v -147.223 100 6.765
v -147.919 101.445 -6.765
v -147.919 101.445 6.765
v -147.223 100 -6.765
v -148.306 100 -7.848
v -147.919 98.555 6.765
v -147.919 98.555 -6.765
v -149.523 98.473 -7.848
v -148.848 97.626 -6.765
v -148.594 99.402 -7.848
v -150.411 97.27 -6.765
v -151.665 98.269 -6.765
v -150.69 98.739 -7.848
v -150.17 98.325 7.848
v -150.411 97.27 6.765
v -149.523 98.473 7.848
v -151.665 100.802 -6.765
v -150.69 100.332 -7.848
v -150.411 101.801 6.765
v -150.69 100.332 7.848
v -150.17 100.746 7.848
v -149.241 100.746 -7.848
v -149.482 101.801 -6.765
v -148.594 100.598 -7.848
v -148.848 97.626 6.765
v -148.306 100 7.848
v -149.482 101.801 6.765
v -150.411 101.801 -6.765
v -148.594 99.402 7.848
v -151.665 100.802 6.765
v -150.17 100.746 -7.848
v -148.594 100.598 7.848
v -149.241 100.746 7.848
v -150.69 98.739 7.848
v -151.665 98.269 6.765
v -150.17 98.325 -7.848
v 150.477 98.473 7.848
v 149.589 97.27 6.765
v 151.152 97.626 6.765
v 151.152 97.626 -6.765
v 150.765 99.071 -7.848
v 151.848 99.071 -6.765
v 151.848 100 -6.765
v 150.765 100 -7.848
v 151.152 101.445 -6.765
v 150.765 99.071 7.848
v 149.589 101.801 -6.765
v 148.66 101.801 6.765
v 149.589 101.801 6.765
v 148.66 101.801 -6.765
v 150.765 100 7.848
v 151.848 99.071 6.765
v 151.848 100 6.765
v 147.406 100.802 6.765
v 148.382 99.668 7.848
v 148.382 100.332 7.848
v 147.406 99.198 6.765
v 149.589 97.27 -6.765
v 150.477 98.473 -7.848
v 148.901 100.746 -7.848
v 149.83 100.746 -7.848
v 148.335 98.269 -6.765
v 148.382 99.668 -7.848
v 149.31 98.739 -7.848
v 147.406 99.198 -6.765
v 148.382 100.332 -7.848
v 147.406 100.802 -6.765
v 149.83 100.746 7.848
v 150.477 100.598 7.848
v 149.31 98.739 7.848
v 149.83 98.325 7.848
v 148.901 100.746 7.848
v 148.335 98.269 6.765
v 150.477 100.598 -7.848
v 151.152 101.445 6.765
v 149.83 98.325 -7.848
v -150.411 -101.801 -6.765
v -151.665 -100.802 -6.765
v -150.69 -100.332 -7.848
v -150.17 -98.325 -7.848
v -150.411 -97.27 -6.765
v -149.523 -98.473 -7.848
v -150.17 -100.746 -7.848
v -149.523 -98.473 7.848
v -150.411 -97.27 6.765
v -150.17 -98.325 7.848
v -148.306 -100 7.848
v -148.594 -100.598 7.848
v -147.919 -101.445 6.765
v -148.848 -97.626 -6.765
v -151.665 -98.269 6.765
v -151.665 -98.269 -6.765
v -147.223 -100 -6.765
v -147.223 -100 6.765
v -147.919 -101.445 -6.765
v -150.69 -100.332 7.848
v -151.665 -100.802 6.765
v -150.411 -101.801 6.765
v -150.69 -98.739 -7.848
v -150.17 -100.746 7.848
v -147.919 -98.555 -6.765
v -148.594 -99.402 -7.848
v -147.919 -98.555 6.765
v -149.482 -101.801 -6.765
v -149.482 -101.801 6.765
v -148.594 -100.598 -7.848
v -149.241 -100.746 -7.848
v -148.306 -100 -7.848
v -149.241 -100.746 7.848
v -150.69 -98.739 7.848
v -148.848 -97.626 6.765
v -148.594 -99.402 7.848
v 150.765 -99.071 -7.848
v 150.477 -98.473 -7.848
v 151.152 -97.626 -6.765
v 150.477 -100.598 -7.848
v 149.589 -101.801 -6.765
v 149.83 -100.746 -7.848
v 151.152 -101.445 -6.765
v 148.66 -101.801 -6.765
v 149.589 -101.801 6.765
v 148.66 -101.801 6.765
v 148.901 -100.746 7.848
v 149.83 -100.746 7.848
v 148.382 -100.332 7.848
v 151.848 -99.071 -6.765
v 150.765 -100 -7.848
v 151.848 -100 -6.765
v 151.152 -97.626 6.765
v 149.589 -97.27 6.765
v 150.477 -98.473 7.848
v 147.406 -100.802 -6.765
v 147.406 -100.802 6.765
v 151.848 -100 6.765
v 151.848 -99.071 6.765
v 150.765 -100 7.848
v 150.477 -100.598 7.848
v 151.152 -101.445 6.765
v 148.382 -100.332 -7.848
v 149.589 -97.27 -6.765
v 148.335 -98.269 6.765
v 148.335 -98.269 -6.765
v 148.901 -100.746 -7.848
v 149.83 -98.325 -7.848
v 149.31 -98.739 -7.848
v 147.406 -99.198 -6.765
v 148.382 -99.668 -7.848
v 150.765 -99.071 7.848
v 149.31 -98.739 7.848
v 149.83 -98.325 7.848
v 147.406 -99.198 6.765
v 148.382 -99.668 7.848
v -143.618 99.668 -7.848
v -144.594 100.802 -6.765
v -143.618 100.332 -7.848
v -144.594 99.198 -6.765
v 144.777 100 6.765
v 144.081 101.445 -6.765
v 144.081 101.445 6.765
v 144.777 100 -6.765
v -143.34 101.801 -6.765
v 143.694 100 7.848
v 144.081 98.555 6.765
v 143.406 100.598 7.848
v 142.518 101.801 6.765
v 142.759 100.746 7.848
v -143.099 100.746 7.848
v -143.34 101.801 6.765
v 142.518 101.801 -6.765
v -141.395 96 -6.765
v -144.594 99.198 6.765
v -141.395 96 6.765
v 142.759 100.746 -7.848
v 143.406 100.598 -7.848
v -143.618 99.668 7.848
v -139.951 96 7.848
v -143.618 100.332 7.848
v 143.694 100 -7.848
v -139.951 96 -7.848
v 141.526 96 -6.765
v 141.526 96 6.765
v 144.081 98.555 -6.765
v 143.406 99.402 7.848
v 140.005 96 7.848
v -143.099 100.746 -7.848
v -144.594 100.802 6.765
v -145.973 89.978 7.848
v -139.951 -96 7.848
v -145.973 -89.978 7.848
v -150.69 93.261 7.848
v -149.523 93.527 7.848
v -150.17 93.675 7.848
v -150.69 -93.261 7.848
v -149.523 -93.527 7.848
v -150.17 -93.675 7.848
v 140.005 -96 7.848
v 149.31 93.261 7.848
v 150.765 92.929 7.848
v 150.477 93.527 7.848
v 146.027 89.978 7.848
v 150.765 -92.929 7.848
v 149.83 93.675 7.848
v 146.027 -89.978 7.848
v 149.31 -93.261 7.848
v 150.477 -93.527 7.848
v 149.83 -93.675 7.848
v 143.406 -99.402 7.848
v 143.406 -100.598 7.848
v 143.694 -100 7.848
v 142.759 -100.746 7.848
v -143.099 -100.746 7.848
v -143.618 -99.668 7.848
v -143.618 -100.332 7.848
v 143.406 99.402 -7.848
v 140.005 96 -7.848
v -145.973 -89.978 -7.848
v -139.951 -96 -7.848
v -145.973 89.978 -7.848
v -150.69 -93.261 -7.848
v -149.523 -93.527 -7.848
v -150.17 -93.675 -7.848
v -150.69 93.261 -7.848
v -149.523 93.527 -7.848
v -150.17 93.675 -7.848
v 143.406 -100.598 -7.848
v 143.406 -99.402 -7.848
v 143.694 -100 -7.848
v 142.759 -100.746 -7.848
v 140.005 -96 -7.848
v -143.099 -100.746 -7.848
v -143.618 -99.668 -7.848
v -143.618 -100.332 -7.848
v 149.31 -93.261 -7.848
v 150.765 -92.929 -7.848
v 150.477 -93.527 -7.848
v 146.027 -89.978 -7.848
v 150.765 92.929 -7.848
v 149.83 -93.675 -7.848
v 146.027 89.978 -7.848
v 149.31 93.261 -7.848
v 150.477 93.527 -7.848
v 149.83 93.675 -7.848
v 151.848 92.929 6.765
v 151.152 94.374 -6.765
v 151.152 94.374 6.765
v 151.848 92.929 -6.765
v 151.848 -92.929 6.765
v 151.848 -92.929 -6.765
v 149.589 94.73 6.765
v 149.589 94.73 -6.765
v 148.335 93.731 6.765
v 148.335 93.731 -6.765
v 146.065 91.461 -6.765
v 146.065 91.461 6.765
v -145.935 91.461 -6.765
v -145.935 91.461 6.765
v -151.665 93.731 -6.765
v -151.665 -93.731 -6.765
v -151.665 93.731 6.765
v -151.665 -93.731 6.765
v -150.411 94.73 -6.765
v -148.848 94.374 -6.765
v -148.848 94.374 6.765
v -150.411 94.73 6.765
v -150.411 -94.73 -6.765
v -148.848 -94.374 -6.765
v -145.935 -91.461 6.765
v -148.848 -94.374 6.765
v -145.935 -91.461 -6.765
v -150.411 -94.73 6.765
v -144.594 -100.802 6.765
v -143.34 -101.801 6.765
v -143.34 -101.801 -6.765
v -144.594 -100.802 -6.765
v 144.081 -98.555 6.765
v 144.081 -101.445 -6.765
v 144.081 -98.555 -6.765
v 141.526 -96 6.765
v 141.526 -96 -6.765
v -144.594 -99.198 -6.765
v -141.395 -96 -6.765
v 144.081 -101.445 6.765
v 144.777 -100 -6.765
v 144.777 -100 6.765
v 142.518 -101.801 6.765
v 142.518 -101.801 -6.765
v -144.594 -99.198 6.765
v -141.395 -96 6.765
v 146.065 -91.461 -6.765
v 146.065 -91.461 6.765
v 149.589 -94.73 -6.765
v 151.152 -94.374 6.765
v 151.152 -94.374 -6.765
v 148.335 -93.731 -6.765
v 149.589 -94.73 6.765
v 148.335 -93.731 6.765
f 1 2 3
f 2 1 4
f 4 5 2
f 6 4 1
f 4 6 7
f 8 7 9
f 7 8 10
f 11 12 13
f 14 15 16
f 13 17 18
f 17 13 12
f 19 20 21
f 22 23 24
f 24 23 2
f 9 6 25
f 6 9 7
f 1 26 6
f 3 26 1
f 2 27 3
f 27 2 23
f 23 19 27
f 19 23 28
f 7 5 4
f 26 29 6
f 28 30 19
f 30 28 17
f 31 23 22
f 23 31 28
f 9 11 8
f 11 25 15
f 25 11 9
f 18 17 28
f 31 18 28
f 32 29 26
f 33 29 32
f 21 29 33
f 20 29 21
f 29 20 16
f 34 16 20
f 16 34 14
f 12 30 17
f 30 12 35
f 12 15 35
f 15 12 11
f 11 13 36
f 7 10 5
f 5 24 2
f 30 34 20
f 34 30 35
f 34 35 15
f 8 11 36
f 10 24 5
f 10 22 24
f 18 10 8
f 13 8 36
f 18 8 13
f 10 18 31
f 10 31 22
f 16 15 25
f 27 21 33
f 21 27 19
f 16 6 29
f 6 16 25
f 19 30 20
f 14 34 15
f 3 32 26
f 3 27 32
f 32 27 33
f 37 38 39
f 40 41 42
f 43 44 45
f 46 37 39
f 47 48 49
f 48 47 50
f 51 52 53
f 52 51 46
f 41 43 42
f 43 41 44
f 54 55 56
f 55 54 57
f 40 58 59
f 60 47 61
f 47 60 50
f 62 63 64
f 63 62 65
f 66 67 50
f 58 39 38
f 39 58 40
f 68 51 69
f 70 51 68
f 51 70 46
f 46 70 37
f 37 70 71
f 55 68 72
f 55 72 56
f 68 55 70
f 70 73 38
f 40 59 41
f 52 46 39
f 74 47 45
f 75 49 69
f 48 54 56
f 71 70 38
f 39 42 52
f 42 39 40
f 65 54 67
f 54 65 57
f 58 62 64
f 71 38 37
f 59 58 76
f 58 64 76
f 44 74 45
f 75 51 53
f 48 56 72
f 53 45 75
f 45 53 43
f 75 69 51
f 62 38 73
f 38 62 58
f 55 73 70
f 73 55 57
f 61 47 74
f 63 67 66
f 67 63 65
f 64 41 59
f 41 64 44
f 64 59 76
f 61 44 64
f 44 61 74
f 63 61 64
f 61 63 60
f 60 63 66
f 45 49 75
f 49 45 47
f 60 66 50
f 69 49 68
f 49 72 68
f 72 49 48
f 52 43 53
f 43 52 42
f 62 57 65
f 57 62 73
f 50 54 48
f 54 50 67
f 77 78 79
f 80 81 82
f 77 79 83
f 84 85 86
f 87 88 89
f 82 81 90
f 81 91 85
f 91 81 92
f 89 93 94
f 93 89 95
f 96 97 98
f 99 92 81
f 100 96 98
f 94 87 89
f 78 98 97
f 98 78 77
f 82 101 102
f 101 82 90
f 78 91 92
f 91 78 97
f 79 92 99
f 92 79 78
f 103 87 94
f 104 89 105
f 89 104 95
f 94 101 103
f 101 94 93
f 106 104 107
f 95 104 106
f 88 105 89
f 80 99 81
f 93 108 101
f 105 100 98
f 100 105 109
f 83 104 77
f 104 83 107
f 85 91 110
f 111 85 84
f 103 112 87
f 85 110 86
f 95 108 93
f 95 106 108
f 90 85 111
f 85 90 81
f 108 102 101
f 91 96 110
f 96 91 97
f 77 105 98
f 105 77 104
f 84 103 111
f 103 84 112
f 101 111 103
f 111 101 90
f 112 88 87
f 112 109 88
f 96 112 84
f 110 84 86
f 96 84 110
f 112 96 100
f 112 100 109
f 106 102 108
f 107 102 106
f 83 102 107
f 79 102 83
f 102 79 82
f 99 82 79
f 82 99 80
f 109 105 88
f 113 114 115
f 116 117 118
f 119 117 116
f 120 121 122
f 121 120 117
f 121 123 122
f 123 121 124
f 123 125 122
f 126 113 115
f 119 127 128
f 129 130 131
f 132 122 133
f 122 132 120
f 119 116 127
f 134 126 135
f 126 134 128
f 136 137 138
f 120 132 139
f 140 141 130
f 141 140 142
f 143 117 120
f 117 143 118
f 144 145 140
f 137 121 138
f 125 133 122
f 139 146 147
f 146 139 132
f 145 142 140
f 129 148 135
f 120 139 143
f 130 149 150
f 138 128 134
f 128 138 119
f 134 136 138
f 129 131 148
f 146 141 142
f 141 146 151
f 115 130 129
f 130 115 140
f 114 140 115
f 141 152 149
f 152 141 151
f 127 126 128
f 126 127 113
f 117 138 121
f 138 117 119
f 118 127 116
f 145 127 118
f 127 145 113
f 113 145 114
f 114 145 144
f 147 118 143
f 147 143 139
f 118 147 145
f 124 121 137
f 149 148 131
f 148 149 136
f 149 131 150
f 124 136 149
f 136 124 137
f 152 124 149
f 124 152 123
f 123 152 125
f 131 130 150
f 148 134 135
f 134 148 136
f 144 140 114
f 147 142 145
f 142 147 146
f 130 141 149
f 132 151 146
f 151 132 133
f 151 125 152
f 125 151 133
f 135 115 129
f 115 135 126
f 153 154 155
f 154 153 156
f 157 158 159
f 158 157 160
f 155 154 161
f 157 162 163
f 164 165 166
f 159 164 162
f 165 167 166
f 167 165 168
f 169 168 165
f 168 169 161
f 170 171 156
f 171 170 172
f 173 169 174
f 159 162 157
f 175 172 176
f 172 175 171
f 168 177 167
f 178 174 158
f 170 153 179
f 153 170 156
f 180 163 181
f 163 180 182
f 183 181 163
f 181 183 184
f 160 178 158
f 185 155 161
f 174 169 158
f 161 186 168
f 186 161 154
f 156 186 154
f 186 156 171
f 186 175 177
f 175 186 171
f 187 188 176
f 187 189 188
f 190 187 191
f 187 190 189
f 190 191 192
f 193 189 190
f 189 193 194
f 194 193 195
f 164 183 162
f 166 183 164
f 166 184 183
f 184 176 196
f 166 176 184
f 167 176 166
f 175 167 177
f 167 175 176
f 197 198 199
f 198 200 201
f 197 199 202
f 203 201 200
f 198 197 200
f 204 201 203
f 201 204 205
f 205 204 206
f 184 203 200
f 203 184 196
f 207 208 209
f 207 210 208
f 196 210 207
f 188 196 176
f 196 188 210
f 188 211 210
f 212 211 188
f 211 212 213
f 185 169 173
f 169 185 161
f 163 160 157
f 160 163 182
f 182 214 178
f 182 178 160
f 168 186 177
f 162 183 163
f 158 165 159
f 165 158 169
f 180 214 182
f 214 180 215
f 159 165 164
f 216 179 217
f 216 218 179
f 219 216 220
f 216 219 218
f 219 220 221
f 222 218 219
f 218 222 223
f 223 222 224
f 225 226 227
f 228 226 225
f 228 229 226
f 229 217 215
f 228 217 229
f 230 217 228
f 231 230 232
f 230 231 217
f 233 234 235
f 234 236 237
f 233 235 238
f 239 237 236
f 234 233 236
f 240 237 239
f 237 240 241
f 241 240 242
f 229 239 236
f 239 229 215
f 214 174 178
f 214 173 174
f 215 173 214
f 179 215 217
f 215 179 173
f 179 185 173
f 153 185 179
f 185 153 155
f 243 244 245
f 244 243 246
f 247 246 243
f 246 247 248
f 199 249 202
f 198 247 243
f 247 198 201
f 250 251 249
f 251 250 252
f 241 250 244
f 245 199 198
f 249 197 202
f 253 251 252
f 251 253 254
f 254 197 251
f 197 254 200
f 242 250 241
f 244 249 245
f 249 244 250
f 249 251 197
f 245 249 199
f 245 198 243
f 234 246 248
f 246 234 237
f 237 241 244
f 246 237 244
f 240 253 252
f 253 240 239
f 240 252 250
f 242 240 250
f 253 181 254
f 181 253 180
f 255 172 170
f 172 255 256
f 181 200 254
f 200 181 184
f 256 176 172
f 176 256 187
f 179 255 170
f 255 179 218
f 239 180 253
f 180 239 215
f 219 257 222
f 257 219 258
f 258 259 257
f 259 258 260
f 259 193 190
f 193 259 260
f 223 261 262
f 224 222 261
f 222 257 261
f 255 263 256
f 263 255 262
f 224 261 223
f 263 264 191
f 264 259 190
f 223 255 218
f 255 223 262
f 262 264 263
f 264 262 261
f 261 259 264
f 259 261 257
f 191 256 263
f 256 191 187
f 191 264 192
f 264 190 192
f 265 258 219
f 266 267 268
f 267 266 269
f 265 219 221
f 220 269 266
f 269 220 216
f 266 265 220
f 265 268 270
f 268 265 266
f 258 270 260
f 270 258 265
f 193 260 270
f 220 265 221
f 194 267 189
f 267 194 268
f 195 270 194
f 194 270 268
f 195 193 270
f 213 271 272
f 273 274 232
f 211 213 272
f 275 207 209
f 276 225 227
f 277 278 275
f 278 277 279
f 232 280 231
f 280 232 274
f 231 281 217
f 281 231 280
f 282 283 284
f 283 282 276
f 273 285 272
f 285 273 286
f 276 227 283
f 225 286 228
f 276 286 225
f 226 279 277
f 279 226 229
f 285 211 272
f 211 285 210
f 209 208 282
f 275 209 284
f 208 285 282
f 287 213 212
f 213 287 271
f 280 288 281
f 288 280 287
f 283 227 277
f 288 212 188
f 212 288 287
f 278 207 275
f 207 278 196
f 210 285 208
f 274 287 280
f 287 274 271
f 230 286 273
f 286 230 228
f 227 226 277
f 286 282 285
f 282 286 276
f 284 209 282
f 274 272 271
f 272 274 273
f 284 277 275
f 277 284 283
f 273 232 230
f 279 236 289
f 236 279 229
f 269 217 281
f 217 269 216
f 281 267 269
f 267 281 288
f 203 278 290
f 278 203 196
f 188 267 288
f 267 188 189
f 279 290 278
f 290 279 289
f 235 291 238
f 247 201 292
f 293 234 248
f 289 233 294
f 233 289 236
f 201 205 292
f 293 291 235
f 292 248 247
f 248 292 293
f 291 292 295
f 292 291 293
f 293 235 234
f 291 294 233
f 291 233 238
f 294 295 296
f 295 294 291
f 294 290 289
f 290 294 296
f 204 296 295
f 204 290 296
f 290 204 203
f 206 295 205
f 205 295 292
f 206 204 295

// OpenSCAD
// Parameters
plate_L = 300; //[150:600:1]
plate_W = 200; //[100:400:1]
plate_T = 12; //[6:24:1]
chamfer_C = 10; //[5:20:1]
edge_fillet_R = 2; //[1:6:0.5]
connect_overlap = 1; //[0.5:2:0.5]

// Base Shapes
module plate_body() {
  translate([0, 0, 0])
    cube([plate_L, plate_W, plate_T], center=true);
}

module corner_chamfer_cut_NE() {
  translate([plate_L/2 - chamfer_C/2 + connect_overlap, plate_W/2 - chamfer_C/2 + connect_overlap, 0])
    rotate([0, 0, 45])
      cube([chamfer_C, chamfer_C, plate_T + 2*connect_overlap], center=true);
}

module corner_chamfer_cut_NW() {
  translate([-plate_L/2 + chamfer_C/2 - connect_overlap, plate_W/2 - chamfer_C/2 + connect_overlap, 0])
    rotate([0, 0, 45])
      cube([chamfer_C, chamfer_C, plate_T + 2*connect_overlap], center=true);
}

module corner_chamfer_cut_SW() {
  translate([-plate_L/2 + chamfer_C/2 - connect_overlap, -plate_W/2 + chamfer_C/2 - connect_overlap, 0])
    rotate([0, 0, 45])
      cube([chamfer_C, chamfer_C, plate_T + 2*connect_overlap], center=true);
}

module corner_chamfer_cut_SE() {
  translate([plate_L/2 - chamfer_C/2 + connect_overlap, -plate_W/2 + chamfer_C/2 - connect_overlap, 0])
    rotate([0, 0, 45])
      cube([chamfer_C, chamfer_C, plate_T + 2*connect_overlap], center=true);
}

module edge_fillet_sphere() {
  translate([0, 0, 0])
    sphere(r=edge_fillet_R, center=true);
}

// Operations
module corner_chamfers() {
  difference() {
    plate_body();
    corner_chamfer_cut_NE();
    corner_chamfer_cut_NW();
    corner_chamfer_cut_SW();
    corner_chamfer_cut_SE();
  }
}

module edge_fillet() {
  minkowski() {
    corner_chamfers();
    edge_fillet_sphere();
  }
}

// Final Output
color("Silver") edge_fillet();
